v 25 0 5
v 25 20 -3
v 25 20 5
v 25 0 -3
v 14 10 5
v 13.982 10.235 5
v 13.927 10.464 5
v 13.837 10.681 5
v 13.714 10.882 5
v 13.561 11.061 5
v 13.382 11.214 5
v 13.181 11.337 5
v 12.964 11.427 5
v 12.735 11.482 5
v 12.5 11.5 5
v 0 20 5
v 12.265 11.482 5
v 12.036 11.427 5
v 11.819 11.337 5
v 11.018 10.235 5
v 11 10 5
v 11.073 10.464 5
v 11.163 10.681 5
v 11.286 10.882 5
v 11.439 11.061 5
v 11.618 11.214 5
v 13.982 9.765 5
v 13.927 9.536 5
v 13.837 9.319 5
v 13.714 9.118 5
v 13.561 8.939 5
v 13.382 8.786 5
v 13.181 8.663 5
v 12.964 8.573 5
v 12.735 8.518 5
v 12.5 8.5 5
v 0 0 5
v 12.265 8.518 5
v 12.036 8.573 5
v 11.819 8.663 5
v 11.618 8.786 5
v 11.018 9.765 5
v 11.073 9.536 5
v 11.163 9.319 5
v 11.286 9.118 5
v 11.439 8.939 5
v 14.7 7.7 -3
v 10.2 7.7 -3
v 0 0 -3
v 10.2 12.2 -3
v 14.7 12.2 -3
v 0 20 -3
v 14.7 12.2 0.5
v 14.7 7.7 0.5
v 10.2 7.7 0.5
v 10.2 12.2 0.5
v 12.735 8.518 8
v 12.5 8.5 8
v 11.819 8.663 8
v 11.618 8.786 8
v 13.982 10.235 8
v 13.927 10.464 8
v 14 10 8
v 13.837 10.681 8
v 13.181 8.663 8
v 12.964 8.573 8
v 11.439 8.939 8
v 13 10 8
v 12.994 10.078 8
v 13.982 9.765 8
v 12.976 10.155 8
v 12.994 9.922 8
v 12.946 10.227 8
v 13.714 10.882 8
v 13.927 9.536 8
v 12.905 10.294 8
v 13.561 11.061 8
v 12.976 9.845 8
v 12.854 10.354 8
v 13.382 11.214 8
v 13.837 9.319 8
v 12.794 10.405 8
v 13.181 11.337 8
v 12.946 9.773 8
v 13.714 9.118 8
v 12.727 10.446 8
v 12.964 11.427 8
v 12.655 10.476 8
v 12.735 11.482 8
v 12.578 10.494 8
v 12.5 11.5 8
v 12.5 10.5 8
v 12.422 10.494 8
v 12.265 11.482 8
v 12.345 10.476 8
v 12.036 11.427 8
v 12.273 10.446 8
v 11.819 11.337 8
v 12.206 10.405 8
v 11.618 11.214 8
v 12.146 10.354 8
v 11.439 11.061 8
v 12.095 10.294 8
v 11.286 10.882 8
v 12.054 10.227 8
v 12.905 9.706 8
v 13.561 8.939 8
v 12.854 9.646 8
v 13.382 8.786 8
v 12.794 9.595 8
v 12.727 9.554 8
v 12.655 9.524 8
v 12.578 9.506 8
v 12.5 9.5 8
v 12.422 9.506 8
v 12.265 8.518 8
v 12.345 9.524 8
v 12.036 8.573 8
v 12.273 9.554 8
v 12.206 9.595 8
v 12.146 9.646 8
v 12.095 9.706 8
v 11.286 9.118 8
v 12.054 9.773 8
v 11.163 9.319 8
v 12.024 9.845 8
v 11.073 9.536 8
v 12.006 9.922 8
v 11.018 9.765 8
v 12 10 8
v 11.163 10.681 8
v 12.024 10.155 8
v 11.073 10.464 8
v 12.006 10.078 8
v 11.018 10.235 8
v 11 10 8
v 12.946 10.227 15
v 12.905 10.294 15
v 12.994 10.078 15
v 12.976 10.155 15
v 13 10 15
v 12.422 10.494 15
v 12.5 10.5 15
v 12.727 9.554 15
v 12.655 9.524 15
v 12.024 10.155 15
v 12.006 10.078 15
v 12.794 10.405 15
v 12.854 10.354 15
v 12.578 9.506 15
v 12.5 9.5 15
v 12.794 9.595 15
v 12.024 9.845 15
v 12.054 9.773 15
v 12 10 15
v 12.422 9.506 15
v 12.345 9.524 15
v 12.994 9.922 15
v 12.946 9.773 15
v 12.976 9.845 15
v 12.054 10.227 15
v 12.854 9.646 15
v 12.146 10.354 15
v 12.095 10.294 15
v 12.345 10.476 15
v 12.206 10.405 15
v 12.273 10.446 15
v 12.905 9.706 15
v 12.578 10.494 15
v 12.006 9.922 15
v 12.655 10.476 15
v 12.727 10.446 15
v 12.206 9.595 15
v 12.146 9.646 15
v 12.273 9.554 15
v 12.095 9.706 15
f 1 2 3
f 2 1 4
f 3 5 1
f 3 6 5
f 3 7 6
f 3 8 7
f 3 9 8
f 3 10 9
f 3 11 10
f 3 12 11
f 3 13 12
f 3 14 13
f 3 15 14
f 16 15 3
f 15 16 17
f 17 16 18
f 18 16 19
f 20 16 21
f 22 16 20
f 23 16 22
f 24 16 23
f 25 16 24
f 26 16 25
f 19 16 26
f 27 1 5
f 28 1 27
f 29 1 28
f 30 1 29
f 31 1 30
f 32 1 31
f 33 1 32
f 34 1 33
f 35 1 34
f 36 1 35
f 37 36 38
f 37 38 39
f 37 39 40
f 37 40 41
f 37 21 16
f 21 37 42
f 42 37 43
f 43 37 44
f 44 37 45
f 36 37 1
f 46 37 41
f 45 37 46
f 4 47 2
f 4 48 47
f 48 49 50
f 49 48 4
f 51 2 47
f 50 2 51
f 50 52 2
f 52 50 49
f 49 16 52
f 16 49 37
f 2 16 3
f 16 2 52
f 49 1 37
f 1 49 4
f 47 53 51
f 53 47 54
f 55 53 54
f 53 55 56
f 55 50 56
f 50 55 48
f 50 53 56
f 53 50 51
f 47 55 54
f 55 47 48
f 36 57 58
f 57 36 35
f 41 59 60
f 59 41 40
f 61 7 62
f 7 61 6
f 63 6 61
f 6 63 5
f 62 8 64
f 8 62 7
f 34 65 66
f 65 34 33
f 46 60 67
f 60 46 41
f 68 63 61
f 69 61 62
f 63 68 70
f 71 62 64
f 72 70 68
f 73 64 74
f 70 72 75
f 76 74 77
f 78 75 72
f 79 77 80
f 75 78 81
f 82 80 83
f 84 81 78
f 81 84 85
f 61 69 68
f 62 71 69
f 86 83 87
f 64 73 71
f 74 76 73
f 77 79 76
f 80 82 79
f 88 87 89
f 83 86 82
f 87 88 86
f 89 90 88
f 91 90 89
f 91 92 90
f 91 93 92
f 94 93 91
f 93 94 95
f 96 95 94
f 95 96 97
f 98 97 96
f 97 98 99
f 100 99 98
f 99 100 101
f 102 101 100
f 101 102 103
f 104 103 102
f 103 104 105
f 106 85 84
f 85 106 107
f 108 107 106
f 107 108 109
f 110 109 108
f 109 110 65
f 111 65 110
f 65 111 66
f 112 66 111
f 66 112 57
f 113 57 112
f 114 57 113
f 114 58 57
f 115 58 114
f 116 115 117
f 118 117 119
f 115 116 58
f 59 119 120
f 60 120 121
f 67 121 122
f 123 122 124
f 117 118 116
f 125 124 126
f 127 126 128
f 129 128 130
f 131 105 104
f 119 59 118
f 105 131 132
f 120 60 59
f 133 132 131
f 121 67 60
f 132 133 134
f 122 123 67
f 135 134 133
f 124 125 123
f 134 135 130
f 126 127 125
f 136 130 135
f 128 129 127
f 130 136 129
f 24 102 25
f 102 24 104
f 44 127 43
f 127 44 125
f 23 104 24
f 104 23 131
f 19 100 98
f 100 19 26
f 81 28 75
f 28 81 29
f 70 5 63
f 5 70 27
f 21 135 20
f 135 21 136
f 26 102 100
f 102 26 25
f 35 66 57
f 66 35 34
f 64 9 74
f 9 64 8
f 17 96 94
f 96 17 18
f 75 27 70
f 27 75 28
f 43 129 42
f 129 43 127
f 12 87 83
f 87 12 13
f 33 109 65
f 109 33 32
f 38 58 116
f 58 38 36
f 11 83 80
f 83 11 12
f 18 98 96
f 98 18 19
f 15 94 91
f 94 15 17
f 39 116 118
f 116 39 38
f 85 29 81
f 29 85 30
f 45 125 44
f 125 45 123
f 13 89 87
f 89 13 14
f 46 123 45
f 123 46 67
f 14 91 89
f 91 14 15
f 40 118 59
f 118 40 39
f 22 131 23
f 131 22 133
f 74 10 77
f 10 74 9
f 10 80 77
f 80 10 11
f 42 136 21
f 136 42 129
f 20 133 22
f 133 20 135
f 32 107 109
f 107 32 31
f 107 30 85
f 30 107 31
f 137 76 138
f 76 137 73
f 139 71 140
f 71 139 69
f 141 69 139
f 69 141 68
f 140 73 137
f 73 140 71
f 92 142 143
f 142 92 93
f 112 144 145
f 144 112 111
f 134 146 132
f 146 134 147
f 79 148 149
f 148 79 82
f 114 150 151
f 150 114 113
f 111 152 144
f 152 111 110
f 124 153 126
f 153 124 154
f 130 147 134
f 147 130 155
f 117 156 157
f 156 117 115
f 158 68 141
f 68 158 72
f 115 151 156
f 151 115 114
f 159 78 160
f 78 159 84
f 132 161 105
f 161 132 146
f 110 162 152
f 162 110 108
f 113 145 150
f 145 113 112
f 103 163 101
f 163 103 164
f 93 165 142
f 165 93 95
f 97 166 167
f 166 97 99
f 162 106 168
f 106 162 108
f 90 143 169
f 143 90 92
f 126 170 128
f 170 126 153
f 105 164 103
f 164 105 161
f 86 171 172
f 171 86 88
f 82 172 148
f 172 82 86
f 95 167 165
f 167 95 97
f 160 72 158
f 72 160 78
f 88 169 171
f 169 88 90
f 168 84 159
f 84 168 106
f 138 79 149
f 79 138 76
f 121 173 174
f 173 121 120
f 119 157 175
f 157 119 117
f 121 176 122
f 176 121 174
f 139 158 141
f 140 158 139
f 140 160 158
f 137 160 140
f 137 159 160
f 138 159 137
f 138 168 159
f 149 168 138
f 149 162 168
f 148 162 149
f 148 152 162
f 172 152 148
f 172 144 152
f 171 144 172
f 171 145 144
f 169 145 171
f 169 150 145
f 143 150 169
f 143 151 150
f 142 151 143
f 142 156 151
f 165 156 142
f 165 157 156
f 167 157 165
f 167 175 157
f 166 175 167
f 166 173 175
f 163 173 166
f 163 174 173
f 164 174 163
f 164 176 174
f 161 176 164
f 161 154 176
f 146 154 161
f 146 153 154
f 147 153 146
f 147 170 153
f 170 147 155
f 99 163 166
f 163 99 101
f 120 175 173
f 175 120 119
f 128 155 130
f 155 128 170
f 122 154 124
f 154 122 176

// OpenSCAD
//handle: 
//translate([12.5, 10, -30])
//cylinder(h = 30, d =10,$fn =20); //handle

translate([12.5, 10, 5])
cylinder(h =3, d =3,$fn =40); //support


difference()
{
translate([-0, -0, -3]) //postion platte im koordinatensystem
cube([25, 20, 8]); //2.5cm mal lang, 2 breit, 0,5dick 
    
    translate([10.2, 7.7, -3])
       cube([4.5, 4.5, 3.5]);
    
}




translate([12.5, 10, 8]) //position penöppel, 10 einfach mal al abstand zum rand gesagt, 19,5 ist die mitte(außenkante, daher 0.5 weniger, 3 damit es drinsteckt zur isocher?
cylinder(h = 7, d =1,$fn =40);//DIAMETER 1mm, höhe mal auf 3 gesetzt 
// cylinder braucht iwie keine eckige klammer dazu anscheinend. 

//2x2x3 öffnugn für stäbchen, minimal größer evtl
